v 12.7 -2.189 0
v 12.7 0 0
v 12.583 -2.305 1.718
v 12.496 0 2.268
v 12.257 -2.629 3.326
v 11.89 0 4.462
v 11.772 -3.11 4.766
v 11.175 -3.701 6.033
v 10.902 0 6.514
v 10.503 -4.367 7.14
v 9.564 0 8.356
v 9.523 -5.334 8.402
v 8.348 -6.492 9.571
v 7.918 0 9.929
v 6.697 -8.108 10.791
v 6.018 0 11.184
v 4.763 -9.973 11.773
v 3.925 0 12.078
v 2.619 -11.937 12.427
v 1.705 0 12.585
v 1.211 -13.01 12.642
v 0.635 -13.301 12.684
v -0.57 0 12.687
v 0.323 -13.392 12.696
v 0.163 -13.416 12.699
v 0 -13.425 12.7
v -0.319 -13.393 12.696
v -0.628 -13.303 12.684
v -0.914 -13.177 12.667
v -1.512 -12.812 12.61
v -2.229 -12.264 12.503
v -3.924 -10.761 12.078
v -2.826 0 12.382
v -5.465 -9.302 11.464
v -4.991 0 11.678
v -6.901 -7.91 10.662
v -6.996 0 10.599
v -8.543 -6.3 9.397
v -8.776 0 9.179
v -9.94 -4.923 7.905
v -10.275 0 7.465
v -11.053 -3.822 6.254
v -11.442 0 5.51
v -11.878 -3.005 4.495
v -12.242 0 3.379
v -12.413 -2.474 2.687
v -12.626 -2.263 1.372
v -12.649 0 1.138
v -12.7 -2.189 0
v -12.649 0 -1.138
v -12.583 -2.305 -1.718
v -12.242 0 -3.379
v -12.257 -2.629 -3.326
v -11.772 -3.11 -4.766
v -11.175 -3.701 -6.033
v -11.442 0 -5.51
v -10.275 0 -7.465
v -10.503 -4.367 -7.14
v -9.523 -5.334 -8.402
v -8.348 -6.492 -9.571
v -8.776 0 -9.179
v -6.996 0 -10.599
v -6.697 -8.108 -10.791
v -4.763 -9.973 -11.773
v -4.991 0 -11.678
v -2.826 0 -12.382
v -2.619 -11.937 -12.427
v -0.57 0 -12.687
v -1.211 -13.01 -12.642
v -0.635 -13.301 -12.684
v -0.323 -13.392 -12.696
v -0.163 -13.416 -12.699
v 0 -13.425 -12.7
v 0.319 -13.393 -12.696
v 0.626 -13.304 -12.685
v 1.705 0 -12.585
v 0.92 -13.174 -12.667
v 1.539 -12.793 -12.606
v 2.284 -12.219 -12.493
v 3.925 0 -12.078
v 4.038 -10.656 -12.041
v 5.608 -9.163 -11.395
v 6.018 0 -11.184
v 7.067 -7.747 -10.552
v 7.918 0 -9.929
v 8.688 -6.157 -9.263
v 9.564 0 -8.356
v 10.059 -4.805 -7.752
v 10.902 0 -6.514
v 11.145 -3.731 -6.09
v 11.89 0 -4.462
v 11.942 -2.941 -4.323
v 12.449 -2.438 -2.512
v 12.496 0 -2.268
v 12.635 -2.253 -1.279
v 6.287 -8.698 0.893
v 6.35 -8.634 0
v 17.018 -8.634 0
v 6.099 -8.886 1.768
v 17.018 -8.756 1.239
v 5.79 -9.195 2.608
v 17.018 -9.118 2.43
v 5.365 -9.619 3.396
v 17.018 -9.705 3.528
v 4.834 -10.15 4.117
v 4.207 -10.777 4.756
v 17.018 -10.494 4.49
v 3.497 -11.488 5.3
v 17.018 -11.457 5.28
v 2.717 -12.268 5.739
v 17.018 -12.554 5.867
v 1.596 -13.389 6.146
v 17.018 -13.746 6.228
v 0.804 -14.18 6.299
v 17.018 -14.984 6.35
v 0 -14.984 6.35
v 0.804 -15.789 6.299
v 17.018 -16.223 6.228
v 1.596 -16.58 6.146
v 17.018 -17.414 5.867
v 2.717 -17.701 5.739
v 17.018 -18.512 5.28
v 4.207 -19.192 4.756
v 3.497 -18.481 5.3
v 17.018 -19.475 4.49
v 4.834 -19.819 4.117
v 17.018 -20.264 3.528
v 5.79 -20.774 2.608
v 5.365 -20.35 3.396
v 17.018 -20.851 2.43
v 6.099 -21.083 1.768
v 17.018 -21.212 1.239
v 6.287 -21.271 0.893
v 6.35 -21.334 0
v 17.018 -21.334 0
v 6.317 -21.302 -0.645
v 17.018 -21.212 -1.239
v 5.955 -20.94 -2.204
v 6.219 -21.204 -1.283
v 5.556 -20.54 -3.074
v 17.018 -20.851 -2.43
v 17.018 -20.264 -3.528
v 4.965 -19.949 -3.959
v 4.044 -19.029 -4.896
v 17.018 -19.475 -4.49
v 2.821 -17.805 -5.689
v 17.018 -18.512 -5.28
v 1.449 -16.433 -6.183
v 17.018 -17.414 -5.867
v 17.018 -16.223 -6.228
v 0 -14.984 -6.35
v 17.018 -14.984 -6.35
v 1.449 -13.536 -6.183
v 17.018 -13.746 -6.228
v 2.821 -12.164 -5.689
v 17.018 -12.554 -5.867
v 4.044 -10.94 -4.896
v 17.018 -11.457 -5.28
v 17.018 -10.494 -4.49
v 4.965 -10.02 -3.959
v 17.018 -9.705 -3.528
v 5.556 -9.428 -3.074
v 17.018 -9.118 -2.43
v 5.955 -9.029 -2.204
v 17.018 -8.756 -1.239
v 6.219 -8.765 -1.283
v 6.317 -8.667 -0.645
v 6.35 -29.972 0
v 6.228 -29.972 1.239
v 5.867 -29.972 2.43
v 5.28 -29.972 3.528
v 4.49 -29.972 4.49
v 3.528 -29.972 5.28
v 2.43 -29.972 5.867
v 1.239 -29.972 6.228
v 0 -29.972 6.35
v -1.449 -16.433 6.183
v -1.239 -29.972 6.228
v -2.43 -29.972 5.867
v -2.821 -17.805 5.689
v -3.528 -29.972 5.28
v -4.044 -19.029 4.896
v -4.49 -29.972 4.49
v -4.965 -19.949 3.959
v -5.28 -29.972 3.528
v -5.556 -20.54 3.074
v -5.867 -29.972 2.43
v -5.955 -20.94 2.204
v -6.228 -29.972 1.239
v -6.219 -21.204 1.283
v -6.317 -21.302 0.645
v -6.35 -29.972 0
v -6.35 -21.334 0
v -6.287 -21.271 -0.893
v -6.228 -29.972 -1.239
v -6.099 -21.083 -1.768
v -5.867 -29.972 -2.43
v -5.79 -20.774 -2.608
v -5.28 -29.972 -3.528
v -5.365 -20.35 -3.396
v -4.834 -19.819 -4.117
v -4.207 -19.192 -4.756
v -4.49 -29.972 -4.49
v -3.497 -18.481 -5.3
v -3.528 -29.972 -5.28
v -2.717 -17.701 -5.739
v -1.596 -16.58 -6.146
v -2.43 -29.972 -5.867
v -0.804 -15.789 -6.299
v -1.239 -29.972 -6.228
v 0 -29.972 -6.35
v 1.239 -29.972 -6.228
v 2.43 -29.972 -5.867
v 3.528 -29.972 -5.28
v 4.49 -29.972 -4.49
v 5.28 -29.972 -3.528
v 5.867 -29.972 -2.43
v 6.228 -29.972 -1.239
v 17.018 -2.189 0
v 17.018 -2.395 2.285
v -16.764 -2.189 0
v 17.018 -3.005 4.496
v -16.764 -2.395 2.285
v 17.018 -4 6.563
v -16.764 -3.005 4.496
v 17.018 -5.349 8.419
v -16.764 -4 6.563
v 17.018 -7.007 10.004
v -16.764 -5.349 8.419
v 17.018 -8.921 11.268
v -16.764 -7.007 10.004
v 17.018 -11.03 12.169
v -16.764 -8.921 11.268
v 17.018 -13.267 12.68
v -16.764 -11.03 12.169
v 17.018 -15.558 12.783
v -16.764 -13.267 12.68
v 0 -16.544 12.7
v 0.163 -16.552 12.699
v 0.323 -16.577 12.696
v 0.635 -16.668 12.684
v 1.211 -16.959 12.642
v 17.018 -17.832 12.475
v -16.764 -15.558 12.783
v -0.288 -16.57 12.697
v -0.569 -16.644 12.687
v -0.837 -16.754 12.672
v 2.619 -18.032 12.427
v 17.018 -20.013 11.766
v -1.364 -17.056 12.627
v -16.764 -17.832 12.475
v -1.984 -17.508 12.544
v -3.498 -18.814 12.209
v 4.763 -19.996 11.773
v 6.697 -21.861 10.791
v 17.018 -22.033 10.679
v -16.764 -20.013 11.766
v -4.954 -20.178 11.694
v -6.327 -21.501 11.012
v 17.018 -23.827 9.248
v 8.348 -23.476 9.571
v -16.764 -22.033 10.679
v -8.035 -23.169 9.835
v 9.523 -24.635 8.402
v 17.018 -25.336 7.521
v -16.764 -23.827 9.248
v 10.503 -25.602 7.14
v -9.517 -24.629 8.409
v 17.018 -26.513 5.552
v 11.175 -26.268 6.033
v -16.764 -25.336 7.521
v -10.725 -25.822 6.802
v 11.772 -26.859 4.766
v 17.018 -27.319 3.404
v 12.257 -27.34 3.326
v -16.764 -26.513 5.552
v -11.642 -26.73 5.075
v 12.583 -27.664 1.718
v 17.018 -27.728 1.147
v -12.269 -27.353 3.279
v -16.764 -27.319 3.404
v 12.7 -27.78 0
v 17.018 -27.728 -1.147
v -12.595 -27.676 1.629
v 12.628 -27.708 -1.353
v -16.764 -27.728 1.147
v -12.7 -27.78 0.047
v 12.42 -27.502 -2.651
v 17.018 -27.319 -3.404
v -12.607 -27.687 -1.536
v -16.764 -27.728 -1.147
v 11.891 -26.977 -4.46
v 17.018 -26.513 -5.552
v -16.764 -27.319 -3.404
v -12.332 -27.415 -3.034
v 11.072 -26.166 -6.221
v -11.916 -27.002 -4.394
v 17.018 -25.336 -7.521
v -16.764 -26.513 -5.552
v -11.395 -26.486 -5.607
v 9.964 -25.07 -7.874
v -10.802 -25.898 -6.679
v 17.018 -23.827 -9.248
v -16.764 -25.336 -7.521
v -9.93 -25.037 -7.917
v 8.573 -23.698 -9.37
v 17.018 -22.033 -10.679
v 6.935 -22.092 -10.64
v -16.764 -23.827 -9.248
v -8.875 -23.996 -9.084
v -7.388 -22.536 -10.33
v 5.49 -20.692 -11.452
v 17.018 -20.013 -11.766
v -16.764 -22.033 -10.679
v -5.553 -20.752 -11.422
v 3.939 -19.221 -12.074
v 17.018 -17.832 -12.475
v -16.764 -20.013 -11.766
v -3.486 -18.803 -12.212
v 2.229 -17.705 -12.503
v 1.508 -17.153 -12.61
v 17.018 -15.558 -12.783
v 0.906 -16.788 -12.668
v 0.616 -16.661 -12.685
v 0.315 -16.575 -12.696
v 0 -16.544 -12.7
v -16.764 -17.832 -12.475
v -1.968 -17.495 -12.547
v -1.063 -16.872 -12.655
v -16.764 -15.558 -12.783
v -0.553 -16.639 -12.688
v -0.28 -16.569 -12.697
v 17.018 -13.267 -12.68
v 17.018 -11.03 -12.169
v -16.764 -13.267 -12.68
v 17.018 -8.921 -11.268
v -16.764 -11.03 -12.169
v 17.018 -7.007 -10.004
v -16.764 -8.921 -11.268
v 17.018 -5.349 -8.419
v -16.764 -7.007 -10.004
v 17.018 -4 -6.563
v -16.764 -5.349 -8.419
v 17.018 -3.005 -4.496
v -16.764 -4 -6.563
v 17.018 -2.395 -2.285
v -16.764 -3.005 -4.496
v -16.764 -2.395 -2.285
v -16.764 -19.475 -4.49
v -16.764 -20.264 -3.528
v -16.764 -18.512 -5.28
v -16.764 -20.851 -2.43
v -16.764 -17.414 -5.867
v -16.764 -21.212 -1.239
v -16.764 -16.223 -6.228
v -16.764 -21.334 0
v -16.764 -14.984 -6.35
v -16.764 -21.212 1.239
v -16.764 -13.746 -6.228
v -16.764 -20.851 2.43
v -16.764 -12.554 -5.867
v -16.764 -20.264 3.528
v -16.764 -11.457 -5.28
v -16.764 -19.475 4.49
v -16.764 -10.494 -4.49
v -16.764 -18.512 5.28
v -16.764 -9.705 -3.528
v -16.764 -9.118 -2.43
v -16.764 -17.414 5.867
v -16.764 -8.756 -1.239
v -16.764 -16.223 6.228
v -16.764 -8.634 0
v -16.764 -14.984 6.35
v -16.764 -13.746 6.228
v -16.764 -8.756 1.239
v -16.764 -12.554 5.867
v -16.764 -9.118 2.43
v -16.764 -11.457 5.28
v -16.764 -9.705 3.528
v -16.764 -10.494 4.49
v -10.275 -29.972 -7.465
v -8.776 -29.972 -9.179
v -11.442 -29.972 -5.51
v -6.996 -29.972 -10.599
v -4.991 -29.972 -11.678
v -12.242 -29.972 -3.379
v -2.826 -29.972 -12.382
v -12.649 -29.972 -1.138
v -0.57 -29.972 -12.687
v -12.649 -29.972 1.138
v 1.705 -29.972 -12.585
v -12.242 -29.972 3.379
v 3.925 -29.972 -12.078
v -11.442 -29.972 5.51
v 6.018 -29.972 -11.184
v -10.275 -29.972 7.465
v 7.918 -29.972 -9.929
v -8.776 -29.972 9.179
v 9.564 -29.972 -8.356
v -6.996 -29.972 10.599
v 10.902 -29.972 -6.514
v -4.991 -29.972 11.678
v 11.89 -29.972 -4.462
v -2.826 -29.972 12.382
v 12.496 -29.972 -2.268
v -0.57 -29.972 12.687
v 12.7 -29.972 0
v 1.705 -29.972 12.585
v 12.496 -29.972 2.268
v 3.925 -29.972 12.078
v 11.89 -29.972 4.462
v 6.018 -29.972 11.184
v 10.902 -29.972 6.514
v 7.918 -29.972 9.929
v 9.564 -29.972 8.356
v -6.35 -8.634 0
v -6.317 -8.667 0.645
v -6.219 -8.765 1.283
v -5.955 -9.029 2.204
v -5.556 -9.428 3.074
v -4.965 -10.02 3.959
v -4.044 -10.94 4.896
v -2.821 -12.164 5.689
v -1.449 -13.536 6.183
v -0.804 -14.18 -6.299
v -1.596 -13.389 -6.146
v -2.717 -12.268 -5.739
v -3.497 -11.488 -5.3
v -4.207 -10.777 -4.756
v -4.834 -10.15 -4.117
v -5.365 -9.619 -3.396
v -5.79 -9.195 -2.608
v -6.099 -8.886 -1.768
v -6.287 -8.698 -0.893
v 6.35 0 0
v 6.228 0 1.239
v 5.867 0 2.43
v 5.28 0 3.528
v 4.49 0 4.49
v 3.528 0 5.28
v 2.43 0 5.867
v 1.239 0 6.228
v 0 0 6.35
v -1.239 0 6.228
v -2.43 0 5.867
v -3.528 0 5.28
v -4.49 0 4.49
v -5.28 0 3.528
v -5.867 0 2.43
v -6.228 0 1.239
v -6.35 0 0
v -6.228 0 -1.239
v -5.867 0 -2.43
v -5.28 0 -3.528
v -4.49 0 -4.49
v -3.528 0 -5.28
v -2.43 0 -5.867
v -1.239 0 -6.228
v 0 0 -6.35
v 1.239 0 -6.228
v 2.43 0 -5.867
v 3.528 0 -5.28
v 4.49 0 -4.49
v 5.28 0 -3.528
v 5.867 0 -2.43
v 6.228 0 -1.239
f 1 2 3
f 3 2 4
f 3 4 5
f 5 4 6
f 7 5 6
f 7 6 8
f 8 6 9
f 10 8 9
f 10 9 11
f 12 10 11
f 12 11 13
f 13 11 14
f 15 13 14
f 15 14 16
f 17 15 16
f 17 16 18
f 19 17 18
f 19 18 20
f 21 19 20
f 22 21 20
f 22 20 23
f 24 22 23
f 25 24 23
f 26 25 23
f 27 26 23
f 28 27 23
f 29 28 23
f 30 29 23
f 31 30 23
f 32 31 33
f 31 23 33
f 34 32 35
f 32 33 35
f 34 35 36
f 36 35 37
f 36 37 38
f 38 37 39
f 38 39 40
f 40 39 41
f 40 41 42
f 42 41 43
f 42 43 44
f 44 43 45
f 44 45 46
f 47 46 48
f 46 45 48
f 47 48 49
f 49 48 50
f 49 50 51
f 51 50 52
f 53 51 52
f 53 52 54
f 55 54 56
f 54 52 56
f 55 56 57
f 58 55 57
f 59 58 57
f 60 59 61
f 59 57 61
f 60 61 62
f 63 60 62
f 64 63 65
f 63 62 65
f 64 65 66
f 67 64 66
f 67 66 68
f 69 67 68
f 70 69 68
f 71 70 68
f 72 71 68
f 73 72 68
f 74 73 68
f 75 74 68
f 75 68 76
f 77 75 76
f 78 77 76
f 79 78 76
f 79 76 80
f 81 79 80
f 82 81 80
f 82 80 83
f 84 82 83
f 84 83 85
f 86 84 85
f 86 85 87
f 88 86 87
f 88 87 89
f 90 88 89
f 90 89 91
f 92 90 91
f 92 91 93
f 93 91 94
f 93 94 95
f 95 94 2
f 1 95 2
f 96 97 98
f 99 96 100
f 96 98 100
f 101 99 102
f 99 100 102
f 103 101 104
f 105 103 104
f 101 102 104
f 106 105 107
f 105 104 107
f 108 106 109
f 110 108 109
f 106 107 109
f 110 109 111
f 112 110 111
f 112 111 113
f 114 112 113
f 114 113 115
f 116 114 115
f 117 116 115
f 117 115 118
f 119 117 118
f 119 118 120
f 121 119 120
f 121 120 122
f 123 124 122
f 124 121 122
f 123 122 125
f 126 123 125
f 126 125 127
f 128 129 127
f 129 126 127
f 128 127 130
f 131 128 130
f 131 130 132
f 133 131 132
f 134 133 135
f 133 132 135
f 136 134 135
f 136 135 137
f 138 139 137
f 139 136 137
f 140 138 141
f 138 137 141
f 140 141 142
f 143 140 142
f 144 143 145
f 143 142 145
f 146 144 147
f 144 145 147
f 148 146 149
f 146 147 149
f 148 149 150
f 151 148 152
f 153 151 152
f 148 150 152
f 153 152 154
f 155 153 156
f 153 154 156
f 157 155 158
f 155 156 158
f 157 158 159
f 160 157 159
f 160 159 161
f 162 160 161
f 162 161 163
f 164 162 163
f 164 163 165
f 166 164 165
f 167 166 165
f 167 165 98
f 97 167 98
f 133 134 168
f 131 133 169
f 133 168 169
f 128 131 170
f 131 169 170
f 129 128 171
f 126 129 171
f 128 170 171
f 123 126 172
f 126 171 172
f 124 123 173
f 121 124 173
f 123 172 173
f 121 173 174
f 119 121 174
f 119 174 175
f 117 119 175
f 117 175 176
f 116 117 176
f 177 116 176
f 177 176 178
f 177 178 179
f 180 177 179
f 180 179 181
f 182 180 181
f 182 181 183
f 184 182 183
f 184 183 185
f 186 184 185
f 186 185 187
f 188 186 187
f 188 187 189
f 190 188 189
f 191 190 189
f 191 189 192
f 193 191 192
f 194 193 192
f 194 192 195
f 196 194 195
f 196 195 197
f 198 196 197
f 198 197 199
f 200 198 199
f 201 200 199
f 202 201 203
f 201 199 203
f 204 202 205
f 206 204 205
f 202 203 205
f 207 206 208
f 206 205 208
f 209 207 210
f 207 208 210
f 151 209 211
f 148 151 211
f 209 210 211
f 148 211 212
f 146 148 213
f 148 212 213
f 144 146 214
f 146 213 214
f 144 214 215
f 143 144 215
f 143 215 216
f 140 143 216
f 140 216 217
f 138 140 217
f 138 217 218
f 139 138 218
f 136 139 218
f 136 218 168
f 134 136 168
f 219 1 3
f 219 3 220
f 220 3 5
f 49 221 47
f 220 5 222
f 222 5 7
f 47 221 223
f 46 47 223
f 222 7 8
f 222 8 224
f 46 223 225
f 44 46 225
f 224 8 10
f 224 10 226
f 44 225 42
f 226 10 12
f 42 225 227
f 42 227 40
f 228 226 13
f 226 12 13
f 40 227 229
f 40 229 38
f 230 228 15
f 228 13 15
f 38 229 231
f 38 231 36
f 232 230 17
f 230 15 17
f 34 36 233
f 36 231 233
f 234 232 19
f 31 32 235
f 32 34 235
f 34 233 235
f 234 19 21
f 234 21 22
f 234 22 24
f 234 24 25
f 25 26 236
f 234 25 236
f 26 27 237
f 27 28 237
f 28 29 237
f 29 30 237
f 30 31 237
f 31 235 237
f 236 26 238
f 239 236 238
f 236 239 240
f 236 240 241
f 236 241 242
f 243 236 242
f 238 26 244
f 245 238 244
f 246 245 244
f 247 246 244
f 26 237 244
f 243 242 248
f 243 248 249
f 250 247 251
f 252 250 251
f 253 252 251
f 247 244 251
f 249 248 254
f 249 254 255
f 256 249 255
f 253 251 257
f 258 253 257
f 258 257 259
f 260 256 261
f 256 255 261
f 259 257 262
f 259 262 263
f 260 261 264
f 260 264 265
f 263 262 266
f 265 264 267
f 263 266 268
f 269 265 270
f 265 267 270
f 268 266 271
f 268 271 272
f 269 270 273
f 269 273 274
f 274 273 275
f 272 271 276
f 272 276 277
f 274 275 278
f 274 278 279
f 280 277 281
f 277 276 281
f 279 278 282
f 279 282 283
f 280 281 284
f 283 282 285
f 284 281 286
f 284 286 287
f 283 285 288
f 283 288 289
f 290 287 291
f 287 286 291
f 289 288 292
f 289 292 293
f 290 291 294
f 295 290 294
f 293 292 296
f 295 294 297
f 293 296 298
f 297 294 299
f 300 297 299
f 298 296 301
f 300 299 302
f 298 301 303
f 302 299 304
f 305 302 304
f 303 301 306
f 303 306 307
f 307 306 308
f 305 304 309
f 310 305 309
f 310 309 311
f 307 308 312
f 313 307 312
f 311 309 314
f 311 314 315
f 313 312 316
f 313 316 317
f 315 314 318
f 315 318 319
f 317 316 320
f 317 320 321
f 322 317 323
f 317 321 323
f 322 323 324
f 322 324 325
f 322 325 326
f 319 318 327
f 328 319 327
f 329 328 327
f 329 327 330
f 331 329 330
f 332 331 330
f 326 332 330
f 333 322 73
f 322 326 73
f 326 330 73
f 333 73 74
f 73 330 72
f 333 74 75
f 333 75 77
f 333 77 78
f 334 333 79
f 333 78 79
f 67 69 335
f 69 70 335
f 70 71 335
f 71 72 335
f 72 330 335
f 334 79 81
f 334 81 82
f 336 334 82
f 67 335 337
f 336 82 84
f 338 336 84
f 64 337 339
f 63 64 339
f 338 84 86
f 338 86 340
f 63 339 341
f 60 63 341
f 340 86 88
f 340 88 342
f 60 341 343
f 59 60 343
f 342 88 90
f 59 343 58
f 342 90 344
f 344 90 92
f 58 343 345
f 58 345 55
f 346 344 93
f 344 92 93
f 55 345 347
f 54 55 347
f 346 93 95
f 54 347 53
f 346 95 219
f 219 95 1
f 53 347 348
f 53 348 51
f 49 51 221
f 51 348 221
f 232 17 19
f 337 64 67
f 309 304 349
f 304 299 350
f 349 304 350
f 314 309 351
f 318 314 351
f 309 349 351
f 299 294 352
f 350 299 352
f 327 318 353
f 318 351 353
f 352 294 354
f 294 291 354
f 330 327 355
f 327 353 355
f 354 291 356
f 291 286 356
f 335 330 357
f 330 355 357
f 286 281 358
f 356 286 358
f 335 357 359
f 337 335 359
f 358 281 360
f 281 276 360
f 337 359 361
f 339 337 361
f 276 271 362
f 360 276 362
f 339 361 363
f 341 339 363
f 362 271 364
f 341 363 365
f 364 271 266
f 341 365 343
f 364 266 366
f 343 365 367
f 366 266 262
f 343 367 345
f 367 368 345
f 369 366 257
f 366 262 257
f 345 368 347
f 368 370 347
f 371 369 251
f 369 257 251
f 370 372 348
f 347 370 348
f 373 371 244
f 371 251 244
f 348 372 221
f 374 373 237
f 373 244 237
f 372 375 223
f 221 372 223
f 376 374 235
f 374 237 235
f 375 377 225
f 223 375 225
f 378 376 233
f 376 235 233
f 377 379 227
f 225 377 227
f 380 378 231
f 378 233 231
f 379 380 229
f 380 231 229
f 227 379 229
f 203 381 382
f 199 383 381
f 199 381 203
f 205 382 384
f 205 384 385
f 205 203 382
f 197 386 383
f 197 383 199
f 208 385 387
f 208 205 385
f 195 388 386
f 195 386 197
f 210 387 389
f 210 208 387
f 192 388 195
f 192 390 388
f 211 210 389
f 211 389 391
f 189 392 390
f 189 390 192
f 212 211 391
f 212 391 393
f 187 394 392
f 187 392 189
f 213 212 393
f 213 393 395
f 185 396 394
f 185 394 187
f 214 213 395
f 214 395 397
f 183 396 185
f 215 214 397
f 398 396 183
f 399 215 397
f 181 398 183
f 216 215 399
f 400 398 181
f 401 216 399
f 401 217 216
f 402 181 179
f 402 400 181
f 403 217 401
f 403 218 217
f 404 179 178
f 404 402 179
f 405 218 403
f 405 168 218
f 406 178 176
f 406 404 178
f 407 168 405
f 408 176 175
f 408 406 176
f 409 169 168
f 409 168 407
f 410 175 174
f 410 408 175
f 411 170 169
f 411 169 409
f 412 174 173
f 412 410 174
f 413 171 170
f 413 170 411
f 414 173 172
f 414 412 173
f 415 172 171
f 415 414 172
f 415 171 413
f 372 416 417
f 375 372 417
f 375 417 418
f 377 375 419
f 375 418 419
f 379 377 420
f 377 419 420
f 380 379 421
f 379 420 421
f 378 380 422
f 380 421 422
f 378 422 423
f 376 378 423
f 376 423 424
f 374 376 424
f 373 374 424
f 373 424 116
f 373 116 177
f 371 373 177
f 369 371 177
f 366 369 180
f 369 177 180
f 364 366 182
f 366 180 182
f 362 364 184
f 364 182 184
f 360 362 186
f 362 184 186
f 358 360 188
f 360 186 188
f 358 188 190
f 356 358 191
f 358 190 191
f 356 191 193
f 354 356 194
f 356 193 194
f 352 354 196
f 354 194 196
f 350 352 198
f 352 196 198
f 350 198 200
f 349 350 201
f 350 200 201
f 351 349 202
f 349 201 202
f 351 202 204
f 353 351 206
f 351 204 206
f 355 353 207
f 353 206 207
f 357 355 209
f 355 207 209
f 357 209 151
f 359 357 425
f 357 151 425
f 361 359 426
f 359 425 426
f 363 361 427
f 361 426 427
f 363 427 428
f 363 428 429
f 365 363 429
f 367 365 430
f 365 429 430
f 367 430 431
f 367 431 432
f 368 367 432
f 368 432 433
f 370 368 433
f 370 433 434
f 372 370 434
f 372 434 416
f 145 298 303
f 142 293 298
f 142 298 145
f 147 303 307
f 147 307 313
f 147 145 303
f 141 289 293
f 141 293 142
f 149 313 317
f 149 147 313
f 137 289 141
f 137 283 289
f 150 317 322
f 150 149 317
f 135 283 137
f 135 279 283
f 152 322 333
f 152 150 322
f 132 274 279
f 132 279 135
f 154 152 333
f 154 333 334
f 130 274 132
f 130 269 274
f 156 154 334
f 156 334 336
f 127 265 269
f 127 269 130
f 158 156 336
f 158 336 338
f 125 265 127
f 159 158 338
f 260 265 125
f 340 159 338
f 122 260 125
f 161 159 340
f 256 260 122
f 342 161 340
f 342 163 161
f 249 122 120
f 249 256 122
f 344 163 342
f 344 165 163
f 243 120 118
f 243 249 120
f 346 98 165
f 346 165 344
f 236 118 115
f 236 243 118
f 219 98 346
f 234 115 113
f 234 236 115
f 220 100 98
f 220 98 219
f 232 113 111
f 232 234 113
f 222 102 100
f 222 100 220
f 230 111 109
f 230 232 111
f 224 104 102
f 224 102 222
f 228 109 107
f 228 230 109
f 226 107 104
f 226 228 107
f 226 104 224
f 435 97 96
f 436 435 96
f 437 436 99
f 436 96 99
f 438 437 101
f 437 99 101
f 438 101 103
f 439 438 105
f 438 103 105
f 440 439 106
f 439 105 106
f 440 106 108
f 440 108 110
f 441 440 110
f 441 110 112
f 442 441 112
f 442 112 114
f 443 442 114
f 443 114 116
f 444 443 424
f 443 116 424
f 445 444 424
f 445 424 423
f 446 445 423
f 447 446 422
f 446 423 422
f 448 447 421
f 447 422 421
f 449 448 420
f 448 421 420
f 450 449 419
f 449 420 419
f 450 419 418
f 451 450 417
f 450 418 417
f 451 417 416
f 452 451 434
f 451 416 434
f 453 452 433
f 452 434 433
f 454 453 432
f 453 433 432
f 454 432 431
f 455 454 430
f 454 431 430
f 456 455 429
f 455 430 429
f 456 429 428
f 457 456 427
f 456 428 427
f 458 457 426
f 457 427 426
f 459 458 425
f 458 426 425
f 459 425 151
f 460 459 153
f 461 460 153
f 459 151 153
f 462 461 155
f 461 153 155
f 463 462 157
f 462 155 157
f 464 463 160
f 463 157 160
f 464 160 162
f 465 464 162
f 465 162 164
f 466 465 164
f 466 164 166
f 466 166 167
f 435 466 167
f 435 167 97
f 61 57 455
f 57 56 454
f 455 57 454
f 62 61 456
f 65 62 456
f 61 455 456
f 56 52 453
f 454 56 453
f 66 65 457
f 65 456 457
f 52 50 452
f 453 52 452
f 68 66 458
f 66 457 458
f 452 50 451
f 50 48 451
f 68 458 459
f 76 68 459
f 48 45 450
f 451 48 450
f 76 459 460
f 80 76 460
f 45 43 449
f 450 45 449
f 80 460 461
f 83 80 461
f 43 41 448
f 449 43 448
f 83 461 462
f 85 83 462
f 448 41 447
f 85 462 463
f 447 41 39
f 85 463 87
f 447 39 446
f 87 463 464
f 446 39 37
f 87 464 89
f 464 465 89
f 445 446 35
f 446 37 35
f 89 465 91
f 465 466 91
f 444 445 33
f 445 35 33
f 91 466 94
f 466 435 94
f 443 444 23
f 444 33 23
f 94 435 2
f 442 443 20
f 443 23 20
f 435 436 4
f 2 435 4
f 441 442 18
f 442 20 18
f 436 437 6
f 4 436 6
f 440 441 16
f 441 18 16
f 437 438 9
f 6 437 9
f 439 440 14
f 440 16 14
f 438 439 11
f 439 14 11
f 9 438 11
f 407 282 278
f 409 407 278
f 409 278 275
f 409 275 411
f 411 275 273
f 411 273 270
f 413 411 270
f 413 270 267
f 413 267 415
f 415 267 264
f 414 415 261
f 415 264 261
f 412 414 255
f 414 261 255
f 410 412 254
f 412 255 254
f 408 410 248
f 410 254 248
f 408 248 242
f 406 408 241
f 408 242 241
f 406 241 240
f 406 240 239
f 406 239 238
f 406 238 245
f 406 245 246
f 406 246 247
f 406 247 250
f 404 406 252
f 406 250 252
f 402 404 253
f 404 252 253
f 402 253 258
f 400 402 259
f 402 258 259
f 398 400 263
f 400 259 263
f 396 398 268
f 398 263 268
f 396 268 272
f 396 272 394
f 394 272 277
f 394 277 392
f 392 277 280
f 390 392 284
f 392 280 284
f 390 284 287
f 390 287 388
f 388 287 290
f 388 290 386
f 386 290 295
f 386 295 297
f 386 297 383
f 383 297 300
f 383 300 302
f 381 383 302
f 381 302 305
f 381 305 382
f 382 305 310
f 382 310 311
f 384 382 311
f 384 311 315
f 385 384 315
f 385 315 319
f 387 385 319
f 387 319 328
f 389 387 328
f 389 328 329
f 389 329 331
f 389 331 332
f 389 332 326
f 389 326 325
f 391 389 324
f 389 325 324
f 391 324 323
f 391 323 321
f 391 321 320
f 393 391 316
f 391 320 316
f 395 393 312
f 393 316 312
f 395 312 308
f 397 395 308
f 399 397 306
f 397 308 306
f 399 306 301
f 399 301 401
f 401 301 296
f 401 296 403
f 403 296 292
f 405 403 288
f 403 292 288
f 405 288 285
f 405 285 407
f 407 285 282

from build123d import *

# Parameters (mm, degrees)
F0_R          = 12.7
F1_DEPTH      = 29.972
F2_R          = 12.7953908212
F3_DEPTH      = 16.764
F3_DEPTH_BACK = 17.018
F5_D          = 12.7
F7_D          = 12.7


with BuildPart() as f1:
    # F0 (on Front) → F1 (new body)
    with BuildSketch(Plane.XZ):
        Circle(F0_R)
    extrude(amount=F1_DEPTH)

    # F2 (on Right) → F3 (join, two sides)
    with BuildSketch(Plane.YZ) as f3_sk:
        with Locations((-14.9844205007, 0)):
            Circle(F2_R)
    extrude(amount=-F3_DEPTH)
    extrude(f3_sk.sketch, amount=F3_DEPTH_BACK)

    # F5 (through all)
    with Locations(Plane(origin=(0, 0, 0), x_dir=(-1, 0, 0), z_dir=(0, 1, 0))):
        with Locations((0, 0)):
            Hole(F5_D / 2)

    # F7 (through all)
    with Locations(Plane(origin=(-16.764, 0, 0), x_dir=(0, -1, 0), z_dir=(-1, 0, 0))):
        with Locations((14.9844205007, 0)):
            Hole(F7_D / 2)


solid = f1.part
